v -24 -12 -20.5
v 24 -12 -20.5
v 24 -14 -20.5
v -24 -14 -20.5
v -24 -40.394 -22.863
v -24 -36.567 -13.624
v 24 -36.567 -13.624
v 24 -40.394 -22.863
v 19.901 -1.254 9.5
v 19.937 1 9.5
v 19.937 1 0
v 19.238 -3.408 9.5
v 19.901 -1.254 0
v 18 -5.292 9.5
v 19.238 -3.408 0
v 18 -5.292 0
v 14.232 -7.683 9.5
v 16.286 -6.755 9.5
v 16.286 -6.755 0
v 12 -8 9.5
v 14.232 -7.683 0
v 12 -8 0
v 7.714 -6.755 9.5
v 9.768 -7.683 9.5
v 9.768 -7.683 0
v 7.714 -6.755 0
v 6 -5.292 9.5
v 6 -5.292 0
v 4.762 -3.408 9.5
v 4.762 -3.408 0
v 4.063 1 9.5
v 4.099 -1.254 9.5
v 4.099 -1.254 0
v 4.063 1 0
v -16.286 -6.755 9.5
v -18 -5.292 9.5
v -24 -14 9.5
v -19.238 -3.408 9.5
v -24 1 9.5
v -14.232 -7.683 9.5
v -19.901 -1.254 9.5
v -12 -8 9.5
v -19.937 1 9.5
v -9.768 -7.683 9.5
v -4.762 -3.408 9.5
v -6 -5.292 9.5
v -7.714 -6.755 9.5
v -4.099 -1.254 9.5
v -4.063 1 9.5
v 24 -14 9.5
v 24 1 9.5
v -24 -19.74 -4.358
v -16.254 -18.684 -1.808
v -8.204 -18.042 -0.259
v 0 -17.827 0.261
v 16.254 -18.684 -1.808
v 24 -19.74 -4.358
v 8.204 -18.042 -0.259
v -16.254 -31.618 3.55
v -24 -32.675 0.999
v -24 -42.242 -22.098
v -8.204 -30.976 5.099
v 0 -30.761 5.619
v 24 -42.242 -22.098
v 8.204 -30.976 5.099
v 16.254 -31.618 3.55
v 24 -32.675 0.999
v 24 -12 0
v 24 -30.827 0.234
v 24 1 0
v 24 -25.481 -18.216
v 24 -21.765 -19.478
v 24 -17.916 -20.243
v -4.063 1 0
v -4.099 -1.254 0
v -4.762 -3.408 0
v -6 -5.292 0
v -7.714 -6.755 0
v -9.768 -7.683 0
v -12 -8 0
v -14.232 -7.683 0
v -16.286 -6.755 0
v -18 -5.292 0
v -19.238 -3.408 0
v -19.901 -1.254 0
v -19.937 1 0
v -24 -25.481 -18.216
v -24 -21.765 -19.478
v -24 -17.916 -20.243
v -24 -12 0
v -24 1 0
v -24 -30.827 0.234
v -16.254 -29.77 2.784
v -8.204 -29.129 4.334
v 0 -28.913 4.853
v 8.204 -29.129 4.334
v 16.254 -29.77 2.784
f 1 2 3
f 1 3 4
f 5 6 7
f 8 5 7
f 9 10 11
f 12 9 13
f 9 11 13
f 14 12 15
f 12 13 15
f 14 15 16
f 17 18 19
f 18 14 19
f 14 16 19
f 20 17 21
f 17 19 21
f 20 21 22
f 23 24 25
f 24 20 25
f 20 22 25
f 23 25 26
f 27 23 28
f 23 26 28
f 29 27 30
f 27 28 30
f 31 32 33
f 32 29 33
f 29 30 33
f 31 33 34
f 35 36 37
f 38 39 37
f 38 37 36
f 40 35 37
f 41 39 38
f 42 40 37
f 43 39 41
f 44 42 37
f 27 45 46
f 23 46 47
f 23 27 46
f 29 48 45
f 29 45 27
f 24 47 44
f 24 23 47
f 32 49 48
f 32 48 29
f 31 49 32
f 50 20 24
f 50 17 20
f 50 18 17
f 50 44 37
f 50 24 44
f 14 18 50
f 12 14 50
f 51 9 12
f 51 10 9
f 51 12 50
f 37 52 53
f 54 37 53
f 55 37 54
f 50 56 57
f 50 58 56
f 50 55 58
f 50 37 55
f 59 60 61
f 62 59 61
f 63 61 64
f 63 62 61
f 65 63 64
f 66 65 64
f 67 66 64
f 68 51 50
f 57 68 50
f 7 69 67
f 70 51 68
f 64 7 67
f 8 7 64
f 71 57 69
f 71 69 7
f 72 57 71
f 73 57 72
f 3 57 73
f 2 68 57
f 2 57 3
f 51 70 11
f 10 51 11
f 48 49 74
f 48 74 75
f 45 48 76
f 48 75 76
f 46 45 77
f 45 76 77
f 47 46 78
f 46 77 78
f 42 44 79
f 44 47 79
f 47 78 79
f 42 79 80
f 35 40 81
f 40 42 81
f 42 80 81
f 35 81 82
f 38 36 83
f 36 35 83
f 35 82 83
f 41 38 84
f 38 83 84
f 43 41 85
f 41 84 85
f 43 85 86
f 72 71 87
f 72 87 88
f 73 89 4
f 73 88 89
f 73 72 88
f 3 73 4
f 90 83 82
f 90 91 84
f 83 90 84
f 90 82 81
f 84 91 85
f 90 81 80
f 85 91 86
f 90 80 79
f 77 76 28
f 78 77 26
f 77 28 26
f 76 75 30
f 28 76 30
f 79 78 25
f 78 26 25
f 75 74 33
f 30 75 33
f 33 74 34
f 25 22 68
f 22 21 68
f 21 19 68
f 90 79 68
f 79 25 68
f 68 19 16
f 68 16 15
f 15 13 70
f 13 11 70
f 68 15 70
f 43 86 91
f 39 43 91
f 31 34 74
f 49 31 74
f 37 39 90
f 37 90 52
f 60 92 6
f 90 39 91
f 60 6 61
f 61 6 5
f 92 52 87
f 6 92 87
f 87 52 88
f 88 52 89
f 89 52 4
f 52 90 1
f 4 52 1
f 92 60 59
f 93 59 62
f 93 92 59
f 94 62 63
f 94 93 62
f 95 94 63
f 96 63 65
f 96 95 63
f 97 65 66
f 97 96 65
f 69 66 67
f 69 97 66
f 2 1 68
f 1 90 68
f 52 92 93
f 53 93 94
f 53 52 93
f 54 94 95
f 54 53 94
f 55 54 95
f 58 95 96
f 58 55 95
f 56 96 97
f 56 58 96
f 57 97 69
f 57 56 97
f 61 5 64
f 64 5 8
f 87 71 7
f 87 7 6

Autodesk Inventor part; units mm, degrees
ref_plane "YZ Plane" through (0, 0, 0) normal (1, 0, 0) x (0, 1, 0)
ref_plane "XZ Plane" through (0, 0, 0) normal (0, 1, 0) x (-1, 0, 0)
ref_plane "XY Plane" through (0, 0, 0) normal (0, 0, 1) x (1, 0, 0)
sketch "Sketch1" plane through (0, 0, 0) normal (0, 0, 1) x (1, 0, 0)
  arc A0 (-19.9373, 1) -> (-4.0627, 1) centre (-12, 0) ccw
  arc A1 (4.0627, 1) -> (19.9373, 1) centre (12, 0) ccw
  line L0 (0, 1) -> (-4.0627, 1)
  line L1 (0, 1) -> (4.0627, 1)
  line L2 (-24, 0) -> (-24, 1)
  line L3 (-19.9373, 1) -> (-24, 1)
  line L4 (24, 0) -> (24, 1)
  line L5 (24, 1) -> (19.9373, 1)
  line L6 (24, 0) -> (24, -12)
  line L7 (24, -12) -> (-24, -12)
  line L8 (-24, -12) -> (-24, 0)
  line L9 (24, 1) -> (24, -12)
  line L10 (24, -12) -> (-24, -12)
  line L11 (-24, -12) -> (-24, 1)
  line L12 (-24, 1) -> (-19.9373, 1)
  line L13 (-4.0627, 1) -> (4.0627, 1)
  line L14 (19.9373, 1) -> (24, 1)
  point P0 (0, 0)
  dimension "d4" = 12
  dimension "d5" = 12
  dimension "d6" = 1
  dimension "d7" = 12
extrude "Extrusion1" add sketch "Sketch1" along normal blind 9.5
sketch "Sketch2" plane through (-24, -12, 0) normal (0, -1, 0) x (1, 0, 0)
  line L0 (0, 9.5) -> (48, 9.5) projected
  line L1 (0, 9.5) -> (48, 9.5)
  line L2 (48, 9.5) -> (48, -20.5)
  line L3 (48, -20.5) -> (0, -20.5)
  line L4 (0, -20.5) -> (0, 9.5)
  point P0 (24, 0)
  dimension "d10" = 30
extrude "Extrusion2" add sketch "Sketch2" along normal blind 2
sketch "Sketch3" plane through (-24, -14, 0) normal (0, -1, 0) x (1, 0, 0)
  line L0 (48, 9.5) -> (0, 9.5) projected
  line L1 (0, 9.5) -> (0, -20.5) projected
  line L2 (0, -20.5) -> (48, -20.5) projected
  line L3 (48, -20.5) -> (48, 9.5) projected
  point P0 (24, 0)
revolve "Revolution1" add sketch "Sketch3" angle 22.5 about axis through (24, -14, 9.5) along (-1, 0, 0)
sketch "Sketch4" plane through (-24, -14, 9.5) normal (0, -0.9238795, 0.3826834) x (1, 0, 0)
  line L0 (48, -27.7164) -> (48, -30) projected
  line L1 (48, -30) -> (0, -30)
  line L2 (0, -30) -> (0, -15)
  line L3 (48, -15) -> (48, -30)
  line L4 (48, -8.0115) -> (48, -26.951) projected
  line L5 (0, -26.951) -> (0, -8.0115) projected
  arc A0 (48, -15) -> (0, -15) centre (24, -70.1) ccw
  point P0 (24, -3.4193)
extrude "Extrusion3" add sketch "Sketch4" along normal blind 12
sketch "Sketch5" plane through (-24, -25.0866, 14.0922) normal (0, -0.9238795, 0.3826834) x (1, 0, 0)
  arc A0 (48, -15) -> (0, -15) centre (24, -70.1) ccw projected
  arc A1 (48, -15) -> (0, -15) centre (24, -70.1) ccw
  line L0 (48, -15) -> (48, -40)
  line L1 (0, -15) -> (0, -40)
  line L2 (0, -40) -> (48, -40)
  point P0 (24, -3.4193)
  dimension "d19" = 25
  dimension "d20" = 25
extrude "Extrusion4" add sketch "Sketch5" along normal blind 2
properties part number "HatSensorMount03FB"
